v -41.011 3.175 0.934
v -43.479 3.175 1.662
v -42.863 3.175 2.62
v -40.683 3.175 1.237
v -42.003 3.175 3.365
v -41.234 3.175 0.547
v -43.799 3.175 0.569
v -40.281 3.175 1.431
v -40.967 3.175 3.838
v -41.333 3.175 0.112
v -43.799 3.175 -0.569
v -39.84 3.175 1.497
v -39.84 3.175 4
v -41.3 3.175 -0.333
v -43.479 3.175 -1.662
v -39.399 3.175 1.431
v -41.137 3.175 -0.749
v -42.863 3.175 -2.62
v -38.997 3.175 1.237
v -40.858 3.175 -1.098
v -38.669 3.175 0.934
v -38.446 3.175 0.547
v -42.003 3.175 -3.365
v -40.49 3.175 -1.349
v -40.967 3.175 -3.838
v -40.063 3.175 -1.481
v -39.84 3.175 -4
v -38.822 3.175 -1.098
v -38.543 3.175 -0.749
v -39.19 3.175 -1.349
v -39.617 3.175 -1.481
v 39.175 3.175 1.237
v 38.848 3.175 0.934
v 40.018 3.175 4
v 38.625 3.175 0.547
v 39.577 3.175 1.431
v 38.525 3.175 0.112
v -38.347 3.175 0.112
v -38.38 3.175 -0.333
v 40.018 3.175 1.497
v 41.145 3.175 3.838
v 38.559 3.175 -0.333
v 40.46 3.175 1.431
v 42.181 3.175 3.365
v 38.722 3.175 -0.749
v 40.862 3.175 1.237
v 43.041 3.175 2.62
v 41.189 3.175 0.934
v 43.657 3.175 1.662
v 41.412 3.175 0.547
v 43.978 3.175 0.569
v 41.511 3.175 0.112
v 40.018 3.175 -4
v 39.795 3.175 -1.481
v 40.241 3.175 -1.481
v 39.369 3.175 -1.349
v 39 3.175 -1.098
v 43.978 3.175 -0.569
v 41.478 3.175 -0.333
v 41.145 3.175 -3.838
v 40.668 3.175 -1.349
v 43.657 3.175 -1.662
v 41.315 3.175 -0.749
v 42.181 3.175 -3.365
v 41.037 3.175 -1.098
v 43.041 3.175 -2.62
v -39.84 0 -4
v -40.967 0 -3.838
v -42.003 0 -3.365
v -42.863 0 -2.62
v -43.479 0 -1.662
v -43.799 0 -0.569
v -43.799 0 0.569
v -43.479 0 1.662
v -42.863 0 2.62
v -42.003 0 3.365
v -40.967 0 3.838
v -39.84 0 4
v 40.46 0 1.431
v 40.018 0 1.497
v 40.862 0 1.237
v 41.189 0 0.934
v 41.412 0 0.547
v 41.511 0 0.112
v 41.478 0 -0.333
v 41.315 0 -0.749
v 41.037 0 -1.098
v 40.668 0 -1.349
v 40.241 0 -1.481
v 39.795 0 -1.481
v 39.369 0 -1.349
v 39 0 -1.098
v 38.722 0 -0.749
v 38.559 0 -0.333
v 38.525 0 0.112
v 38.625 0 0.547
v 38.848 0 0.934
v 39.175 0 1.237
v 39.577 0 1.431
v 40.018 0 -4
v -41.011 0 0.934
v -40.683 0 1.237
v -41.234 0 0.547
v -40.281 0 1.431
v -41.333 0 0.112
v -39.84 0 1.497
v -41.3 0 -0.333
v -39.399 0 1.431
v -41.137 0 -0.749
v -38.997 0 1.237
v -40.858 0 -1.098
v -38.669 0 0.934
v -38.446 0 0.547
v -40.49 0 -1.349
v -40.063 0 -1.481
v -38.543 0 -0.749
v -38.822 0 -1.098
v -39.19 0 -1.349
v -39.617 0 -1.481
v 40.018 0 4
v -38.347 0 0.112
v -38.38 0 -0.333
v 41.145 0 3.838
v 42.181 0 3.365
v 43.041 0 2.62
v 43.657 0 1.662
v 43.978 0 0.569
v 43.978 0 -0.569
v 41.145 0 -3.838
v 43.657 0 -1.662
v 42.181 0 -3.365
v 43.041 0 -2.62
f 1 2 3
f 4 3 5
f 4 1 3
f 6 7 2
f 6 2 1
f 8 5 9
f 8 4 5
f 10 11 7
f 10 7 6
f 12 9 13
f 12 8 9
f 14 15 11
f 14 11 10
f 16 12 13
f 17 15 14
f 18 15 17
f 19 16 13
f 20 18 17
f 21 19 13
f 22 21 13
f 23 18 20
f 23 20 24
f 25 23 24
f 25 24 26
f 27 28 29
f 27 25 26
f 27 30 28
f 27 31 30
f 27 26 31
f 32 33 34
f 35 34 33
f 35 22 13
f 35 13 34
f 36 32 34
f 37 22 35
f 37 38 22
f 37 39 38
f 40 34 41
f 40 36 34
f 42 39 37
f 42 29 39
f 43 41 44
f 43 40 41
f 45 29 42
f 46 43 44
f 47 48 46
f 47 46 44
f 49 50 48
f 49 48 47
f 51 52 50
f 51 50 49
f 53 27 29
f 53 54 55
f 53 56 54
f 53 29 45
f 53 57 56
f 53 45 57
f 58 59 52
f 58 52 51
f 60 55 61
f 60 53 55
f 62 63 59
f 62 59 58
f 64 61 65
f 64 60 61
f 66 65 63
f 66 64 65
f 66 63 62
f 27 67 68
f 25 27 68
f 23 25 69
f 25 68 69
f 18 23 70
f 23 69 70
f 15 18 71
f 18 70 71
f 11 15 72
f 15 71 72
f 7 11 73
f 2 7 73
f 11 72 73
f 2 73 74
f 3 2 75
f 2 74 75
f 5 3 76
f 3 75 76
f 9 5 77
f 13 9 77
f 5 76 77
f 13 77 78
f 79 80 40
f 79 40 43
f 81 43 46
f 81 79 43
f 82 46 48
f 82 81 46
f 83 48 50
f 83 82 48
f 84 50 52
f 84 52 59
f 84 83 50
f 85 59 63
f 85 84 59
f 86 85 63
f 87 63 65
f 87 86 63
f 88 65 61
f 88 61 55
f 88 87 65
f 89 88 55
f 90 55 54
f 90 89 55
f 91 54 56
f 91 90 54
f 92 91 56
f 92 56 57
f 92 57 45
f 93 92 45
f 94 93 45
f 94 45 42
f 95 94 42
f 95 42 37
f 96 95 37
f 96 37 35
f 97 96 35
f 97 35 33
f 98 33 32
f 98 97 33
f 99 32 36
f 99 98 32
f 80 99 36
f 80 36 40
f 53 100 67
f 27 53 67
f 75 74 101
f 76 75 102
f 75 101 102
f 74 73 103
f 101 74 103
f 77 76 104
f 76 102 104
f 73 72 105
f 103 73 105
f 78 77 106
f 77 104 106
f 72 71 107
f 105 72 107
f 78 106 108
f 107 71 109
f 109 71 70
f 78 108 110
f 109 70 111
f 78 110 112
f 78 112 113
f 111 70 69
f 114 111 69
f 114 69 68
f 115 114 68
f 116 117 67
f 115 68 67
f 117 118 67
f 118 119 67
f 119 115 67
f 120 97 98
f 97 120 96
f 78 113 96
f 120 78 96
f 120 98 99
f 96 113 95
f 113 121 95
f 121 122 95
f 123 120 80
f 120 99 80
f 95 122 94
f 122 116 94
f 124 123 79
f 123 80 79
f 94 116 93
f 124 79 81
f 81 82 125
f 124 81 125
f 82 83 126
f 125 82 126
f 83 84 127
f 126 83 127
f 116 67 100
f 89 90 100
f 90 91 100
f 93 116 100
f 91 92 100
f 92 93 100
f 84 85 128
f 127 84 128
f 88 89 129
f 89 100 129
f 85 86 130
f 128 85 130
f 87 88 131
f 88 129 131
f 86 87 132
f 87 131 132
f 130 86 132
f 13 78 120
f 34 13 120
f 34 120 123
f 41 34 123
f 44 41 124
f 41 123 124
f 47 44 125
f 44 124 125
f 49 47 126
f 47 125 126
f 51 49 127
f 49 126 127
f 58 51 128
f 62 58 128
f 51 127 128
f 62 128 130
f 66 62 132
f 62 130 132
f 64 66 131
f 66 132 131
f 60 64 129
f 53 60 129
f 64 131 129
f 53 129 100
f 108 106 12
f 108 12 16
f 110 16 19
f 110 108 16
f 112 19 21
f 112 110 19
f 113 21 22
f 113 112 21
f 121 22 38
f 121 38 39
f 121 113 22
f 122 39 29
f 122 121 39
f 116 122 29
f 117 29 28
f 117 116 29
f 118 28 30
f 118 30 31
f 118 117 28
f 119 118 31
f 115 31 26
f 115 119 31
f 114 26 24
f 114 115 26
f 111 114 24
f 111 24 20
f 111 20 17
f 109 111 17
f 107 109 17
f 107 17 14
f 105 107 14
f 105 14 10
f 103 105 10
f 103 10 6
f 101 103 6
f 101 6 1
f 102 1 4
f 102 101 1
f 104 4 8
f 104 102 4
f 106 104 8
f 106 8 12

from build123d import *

# Parameters (mm, degrees)
SKETCH1_R           = 1.497293459
BOSS_EXTRUDE1_DEPTH = 3.175


with BuildPart() as part:
    # Sketch1 → Boss-Extrude1 (new body)
    with BuildSketch(Plane(origin=(0, 0, 0), x_dir=(1, 0, 0), z_dir=(0, 1, 0))):
        with BuildLine():
            Line((40.018335965, 4.000091093), (-39.839960243, 4.000091093))
            ThreePointArc((-39.839960243, 4.000091093), (-43.840051334, 2e-09), (-39.839960243, -4.000091089))
            Line((-39.839960243, -4.000091089), (40.018335965, -4.000091089))
            ThreePointArc((40.018335965, -4.000091089), (44.018427056, 2e-09), (40.018335965, 4.000091093))
        make_face()
        with Locations(Location((-39.839960243, 2e-09, 0), (0, 0, 270))):
            Circle(SKETCH1_R, mode=Mode.SUBTRACT)
        with Locations(Location((40.018335965, 2e-09, 0), (0, 0, 270))):
            Circle(SKETCH1_R, mode=Mode.SUBTRACT)
    extrude(amount=BOSS_EXTRUDE1_DEPTH)


solid = part.part
